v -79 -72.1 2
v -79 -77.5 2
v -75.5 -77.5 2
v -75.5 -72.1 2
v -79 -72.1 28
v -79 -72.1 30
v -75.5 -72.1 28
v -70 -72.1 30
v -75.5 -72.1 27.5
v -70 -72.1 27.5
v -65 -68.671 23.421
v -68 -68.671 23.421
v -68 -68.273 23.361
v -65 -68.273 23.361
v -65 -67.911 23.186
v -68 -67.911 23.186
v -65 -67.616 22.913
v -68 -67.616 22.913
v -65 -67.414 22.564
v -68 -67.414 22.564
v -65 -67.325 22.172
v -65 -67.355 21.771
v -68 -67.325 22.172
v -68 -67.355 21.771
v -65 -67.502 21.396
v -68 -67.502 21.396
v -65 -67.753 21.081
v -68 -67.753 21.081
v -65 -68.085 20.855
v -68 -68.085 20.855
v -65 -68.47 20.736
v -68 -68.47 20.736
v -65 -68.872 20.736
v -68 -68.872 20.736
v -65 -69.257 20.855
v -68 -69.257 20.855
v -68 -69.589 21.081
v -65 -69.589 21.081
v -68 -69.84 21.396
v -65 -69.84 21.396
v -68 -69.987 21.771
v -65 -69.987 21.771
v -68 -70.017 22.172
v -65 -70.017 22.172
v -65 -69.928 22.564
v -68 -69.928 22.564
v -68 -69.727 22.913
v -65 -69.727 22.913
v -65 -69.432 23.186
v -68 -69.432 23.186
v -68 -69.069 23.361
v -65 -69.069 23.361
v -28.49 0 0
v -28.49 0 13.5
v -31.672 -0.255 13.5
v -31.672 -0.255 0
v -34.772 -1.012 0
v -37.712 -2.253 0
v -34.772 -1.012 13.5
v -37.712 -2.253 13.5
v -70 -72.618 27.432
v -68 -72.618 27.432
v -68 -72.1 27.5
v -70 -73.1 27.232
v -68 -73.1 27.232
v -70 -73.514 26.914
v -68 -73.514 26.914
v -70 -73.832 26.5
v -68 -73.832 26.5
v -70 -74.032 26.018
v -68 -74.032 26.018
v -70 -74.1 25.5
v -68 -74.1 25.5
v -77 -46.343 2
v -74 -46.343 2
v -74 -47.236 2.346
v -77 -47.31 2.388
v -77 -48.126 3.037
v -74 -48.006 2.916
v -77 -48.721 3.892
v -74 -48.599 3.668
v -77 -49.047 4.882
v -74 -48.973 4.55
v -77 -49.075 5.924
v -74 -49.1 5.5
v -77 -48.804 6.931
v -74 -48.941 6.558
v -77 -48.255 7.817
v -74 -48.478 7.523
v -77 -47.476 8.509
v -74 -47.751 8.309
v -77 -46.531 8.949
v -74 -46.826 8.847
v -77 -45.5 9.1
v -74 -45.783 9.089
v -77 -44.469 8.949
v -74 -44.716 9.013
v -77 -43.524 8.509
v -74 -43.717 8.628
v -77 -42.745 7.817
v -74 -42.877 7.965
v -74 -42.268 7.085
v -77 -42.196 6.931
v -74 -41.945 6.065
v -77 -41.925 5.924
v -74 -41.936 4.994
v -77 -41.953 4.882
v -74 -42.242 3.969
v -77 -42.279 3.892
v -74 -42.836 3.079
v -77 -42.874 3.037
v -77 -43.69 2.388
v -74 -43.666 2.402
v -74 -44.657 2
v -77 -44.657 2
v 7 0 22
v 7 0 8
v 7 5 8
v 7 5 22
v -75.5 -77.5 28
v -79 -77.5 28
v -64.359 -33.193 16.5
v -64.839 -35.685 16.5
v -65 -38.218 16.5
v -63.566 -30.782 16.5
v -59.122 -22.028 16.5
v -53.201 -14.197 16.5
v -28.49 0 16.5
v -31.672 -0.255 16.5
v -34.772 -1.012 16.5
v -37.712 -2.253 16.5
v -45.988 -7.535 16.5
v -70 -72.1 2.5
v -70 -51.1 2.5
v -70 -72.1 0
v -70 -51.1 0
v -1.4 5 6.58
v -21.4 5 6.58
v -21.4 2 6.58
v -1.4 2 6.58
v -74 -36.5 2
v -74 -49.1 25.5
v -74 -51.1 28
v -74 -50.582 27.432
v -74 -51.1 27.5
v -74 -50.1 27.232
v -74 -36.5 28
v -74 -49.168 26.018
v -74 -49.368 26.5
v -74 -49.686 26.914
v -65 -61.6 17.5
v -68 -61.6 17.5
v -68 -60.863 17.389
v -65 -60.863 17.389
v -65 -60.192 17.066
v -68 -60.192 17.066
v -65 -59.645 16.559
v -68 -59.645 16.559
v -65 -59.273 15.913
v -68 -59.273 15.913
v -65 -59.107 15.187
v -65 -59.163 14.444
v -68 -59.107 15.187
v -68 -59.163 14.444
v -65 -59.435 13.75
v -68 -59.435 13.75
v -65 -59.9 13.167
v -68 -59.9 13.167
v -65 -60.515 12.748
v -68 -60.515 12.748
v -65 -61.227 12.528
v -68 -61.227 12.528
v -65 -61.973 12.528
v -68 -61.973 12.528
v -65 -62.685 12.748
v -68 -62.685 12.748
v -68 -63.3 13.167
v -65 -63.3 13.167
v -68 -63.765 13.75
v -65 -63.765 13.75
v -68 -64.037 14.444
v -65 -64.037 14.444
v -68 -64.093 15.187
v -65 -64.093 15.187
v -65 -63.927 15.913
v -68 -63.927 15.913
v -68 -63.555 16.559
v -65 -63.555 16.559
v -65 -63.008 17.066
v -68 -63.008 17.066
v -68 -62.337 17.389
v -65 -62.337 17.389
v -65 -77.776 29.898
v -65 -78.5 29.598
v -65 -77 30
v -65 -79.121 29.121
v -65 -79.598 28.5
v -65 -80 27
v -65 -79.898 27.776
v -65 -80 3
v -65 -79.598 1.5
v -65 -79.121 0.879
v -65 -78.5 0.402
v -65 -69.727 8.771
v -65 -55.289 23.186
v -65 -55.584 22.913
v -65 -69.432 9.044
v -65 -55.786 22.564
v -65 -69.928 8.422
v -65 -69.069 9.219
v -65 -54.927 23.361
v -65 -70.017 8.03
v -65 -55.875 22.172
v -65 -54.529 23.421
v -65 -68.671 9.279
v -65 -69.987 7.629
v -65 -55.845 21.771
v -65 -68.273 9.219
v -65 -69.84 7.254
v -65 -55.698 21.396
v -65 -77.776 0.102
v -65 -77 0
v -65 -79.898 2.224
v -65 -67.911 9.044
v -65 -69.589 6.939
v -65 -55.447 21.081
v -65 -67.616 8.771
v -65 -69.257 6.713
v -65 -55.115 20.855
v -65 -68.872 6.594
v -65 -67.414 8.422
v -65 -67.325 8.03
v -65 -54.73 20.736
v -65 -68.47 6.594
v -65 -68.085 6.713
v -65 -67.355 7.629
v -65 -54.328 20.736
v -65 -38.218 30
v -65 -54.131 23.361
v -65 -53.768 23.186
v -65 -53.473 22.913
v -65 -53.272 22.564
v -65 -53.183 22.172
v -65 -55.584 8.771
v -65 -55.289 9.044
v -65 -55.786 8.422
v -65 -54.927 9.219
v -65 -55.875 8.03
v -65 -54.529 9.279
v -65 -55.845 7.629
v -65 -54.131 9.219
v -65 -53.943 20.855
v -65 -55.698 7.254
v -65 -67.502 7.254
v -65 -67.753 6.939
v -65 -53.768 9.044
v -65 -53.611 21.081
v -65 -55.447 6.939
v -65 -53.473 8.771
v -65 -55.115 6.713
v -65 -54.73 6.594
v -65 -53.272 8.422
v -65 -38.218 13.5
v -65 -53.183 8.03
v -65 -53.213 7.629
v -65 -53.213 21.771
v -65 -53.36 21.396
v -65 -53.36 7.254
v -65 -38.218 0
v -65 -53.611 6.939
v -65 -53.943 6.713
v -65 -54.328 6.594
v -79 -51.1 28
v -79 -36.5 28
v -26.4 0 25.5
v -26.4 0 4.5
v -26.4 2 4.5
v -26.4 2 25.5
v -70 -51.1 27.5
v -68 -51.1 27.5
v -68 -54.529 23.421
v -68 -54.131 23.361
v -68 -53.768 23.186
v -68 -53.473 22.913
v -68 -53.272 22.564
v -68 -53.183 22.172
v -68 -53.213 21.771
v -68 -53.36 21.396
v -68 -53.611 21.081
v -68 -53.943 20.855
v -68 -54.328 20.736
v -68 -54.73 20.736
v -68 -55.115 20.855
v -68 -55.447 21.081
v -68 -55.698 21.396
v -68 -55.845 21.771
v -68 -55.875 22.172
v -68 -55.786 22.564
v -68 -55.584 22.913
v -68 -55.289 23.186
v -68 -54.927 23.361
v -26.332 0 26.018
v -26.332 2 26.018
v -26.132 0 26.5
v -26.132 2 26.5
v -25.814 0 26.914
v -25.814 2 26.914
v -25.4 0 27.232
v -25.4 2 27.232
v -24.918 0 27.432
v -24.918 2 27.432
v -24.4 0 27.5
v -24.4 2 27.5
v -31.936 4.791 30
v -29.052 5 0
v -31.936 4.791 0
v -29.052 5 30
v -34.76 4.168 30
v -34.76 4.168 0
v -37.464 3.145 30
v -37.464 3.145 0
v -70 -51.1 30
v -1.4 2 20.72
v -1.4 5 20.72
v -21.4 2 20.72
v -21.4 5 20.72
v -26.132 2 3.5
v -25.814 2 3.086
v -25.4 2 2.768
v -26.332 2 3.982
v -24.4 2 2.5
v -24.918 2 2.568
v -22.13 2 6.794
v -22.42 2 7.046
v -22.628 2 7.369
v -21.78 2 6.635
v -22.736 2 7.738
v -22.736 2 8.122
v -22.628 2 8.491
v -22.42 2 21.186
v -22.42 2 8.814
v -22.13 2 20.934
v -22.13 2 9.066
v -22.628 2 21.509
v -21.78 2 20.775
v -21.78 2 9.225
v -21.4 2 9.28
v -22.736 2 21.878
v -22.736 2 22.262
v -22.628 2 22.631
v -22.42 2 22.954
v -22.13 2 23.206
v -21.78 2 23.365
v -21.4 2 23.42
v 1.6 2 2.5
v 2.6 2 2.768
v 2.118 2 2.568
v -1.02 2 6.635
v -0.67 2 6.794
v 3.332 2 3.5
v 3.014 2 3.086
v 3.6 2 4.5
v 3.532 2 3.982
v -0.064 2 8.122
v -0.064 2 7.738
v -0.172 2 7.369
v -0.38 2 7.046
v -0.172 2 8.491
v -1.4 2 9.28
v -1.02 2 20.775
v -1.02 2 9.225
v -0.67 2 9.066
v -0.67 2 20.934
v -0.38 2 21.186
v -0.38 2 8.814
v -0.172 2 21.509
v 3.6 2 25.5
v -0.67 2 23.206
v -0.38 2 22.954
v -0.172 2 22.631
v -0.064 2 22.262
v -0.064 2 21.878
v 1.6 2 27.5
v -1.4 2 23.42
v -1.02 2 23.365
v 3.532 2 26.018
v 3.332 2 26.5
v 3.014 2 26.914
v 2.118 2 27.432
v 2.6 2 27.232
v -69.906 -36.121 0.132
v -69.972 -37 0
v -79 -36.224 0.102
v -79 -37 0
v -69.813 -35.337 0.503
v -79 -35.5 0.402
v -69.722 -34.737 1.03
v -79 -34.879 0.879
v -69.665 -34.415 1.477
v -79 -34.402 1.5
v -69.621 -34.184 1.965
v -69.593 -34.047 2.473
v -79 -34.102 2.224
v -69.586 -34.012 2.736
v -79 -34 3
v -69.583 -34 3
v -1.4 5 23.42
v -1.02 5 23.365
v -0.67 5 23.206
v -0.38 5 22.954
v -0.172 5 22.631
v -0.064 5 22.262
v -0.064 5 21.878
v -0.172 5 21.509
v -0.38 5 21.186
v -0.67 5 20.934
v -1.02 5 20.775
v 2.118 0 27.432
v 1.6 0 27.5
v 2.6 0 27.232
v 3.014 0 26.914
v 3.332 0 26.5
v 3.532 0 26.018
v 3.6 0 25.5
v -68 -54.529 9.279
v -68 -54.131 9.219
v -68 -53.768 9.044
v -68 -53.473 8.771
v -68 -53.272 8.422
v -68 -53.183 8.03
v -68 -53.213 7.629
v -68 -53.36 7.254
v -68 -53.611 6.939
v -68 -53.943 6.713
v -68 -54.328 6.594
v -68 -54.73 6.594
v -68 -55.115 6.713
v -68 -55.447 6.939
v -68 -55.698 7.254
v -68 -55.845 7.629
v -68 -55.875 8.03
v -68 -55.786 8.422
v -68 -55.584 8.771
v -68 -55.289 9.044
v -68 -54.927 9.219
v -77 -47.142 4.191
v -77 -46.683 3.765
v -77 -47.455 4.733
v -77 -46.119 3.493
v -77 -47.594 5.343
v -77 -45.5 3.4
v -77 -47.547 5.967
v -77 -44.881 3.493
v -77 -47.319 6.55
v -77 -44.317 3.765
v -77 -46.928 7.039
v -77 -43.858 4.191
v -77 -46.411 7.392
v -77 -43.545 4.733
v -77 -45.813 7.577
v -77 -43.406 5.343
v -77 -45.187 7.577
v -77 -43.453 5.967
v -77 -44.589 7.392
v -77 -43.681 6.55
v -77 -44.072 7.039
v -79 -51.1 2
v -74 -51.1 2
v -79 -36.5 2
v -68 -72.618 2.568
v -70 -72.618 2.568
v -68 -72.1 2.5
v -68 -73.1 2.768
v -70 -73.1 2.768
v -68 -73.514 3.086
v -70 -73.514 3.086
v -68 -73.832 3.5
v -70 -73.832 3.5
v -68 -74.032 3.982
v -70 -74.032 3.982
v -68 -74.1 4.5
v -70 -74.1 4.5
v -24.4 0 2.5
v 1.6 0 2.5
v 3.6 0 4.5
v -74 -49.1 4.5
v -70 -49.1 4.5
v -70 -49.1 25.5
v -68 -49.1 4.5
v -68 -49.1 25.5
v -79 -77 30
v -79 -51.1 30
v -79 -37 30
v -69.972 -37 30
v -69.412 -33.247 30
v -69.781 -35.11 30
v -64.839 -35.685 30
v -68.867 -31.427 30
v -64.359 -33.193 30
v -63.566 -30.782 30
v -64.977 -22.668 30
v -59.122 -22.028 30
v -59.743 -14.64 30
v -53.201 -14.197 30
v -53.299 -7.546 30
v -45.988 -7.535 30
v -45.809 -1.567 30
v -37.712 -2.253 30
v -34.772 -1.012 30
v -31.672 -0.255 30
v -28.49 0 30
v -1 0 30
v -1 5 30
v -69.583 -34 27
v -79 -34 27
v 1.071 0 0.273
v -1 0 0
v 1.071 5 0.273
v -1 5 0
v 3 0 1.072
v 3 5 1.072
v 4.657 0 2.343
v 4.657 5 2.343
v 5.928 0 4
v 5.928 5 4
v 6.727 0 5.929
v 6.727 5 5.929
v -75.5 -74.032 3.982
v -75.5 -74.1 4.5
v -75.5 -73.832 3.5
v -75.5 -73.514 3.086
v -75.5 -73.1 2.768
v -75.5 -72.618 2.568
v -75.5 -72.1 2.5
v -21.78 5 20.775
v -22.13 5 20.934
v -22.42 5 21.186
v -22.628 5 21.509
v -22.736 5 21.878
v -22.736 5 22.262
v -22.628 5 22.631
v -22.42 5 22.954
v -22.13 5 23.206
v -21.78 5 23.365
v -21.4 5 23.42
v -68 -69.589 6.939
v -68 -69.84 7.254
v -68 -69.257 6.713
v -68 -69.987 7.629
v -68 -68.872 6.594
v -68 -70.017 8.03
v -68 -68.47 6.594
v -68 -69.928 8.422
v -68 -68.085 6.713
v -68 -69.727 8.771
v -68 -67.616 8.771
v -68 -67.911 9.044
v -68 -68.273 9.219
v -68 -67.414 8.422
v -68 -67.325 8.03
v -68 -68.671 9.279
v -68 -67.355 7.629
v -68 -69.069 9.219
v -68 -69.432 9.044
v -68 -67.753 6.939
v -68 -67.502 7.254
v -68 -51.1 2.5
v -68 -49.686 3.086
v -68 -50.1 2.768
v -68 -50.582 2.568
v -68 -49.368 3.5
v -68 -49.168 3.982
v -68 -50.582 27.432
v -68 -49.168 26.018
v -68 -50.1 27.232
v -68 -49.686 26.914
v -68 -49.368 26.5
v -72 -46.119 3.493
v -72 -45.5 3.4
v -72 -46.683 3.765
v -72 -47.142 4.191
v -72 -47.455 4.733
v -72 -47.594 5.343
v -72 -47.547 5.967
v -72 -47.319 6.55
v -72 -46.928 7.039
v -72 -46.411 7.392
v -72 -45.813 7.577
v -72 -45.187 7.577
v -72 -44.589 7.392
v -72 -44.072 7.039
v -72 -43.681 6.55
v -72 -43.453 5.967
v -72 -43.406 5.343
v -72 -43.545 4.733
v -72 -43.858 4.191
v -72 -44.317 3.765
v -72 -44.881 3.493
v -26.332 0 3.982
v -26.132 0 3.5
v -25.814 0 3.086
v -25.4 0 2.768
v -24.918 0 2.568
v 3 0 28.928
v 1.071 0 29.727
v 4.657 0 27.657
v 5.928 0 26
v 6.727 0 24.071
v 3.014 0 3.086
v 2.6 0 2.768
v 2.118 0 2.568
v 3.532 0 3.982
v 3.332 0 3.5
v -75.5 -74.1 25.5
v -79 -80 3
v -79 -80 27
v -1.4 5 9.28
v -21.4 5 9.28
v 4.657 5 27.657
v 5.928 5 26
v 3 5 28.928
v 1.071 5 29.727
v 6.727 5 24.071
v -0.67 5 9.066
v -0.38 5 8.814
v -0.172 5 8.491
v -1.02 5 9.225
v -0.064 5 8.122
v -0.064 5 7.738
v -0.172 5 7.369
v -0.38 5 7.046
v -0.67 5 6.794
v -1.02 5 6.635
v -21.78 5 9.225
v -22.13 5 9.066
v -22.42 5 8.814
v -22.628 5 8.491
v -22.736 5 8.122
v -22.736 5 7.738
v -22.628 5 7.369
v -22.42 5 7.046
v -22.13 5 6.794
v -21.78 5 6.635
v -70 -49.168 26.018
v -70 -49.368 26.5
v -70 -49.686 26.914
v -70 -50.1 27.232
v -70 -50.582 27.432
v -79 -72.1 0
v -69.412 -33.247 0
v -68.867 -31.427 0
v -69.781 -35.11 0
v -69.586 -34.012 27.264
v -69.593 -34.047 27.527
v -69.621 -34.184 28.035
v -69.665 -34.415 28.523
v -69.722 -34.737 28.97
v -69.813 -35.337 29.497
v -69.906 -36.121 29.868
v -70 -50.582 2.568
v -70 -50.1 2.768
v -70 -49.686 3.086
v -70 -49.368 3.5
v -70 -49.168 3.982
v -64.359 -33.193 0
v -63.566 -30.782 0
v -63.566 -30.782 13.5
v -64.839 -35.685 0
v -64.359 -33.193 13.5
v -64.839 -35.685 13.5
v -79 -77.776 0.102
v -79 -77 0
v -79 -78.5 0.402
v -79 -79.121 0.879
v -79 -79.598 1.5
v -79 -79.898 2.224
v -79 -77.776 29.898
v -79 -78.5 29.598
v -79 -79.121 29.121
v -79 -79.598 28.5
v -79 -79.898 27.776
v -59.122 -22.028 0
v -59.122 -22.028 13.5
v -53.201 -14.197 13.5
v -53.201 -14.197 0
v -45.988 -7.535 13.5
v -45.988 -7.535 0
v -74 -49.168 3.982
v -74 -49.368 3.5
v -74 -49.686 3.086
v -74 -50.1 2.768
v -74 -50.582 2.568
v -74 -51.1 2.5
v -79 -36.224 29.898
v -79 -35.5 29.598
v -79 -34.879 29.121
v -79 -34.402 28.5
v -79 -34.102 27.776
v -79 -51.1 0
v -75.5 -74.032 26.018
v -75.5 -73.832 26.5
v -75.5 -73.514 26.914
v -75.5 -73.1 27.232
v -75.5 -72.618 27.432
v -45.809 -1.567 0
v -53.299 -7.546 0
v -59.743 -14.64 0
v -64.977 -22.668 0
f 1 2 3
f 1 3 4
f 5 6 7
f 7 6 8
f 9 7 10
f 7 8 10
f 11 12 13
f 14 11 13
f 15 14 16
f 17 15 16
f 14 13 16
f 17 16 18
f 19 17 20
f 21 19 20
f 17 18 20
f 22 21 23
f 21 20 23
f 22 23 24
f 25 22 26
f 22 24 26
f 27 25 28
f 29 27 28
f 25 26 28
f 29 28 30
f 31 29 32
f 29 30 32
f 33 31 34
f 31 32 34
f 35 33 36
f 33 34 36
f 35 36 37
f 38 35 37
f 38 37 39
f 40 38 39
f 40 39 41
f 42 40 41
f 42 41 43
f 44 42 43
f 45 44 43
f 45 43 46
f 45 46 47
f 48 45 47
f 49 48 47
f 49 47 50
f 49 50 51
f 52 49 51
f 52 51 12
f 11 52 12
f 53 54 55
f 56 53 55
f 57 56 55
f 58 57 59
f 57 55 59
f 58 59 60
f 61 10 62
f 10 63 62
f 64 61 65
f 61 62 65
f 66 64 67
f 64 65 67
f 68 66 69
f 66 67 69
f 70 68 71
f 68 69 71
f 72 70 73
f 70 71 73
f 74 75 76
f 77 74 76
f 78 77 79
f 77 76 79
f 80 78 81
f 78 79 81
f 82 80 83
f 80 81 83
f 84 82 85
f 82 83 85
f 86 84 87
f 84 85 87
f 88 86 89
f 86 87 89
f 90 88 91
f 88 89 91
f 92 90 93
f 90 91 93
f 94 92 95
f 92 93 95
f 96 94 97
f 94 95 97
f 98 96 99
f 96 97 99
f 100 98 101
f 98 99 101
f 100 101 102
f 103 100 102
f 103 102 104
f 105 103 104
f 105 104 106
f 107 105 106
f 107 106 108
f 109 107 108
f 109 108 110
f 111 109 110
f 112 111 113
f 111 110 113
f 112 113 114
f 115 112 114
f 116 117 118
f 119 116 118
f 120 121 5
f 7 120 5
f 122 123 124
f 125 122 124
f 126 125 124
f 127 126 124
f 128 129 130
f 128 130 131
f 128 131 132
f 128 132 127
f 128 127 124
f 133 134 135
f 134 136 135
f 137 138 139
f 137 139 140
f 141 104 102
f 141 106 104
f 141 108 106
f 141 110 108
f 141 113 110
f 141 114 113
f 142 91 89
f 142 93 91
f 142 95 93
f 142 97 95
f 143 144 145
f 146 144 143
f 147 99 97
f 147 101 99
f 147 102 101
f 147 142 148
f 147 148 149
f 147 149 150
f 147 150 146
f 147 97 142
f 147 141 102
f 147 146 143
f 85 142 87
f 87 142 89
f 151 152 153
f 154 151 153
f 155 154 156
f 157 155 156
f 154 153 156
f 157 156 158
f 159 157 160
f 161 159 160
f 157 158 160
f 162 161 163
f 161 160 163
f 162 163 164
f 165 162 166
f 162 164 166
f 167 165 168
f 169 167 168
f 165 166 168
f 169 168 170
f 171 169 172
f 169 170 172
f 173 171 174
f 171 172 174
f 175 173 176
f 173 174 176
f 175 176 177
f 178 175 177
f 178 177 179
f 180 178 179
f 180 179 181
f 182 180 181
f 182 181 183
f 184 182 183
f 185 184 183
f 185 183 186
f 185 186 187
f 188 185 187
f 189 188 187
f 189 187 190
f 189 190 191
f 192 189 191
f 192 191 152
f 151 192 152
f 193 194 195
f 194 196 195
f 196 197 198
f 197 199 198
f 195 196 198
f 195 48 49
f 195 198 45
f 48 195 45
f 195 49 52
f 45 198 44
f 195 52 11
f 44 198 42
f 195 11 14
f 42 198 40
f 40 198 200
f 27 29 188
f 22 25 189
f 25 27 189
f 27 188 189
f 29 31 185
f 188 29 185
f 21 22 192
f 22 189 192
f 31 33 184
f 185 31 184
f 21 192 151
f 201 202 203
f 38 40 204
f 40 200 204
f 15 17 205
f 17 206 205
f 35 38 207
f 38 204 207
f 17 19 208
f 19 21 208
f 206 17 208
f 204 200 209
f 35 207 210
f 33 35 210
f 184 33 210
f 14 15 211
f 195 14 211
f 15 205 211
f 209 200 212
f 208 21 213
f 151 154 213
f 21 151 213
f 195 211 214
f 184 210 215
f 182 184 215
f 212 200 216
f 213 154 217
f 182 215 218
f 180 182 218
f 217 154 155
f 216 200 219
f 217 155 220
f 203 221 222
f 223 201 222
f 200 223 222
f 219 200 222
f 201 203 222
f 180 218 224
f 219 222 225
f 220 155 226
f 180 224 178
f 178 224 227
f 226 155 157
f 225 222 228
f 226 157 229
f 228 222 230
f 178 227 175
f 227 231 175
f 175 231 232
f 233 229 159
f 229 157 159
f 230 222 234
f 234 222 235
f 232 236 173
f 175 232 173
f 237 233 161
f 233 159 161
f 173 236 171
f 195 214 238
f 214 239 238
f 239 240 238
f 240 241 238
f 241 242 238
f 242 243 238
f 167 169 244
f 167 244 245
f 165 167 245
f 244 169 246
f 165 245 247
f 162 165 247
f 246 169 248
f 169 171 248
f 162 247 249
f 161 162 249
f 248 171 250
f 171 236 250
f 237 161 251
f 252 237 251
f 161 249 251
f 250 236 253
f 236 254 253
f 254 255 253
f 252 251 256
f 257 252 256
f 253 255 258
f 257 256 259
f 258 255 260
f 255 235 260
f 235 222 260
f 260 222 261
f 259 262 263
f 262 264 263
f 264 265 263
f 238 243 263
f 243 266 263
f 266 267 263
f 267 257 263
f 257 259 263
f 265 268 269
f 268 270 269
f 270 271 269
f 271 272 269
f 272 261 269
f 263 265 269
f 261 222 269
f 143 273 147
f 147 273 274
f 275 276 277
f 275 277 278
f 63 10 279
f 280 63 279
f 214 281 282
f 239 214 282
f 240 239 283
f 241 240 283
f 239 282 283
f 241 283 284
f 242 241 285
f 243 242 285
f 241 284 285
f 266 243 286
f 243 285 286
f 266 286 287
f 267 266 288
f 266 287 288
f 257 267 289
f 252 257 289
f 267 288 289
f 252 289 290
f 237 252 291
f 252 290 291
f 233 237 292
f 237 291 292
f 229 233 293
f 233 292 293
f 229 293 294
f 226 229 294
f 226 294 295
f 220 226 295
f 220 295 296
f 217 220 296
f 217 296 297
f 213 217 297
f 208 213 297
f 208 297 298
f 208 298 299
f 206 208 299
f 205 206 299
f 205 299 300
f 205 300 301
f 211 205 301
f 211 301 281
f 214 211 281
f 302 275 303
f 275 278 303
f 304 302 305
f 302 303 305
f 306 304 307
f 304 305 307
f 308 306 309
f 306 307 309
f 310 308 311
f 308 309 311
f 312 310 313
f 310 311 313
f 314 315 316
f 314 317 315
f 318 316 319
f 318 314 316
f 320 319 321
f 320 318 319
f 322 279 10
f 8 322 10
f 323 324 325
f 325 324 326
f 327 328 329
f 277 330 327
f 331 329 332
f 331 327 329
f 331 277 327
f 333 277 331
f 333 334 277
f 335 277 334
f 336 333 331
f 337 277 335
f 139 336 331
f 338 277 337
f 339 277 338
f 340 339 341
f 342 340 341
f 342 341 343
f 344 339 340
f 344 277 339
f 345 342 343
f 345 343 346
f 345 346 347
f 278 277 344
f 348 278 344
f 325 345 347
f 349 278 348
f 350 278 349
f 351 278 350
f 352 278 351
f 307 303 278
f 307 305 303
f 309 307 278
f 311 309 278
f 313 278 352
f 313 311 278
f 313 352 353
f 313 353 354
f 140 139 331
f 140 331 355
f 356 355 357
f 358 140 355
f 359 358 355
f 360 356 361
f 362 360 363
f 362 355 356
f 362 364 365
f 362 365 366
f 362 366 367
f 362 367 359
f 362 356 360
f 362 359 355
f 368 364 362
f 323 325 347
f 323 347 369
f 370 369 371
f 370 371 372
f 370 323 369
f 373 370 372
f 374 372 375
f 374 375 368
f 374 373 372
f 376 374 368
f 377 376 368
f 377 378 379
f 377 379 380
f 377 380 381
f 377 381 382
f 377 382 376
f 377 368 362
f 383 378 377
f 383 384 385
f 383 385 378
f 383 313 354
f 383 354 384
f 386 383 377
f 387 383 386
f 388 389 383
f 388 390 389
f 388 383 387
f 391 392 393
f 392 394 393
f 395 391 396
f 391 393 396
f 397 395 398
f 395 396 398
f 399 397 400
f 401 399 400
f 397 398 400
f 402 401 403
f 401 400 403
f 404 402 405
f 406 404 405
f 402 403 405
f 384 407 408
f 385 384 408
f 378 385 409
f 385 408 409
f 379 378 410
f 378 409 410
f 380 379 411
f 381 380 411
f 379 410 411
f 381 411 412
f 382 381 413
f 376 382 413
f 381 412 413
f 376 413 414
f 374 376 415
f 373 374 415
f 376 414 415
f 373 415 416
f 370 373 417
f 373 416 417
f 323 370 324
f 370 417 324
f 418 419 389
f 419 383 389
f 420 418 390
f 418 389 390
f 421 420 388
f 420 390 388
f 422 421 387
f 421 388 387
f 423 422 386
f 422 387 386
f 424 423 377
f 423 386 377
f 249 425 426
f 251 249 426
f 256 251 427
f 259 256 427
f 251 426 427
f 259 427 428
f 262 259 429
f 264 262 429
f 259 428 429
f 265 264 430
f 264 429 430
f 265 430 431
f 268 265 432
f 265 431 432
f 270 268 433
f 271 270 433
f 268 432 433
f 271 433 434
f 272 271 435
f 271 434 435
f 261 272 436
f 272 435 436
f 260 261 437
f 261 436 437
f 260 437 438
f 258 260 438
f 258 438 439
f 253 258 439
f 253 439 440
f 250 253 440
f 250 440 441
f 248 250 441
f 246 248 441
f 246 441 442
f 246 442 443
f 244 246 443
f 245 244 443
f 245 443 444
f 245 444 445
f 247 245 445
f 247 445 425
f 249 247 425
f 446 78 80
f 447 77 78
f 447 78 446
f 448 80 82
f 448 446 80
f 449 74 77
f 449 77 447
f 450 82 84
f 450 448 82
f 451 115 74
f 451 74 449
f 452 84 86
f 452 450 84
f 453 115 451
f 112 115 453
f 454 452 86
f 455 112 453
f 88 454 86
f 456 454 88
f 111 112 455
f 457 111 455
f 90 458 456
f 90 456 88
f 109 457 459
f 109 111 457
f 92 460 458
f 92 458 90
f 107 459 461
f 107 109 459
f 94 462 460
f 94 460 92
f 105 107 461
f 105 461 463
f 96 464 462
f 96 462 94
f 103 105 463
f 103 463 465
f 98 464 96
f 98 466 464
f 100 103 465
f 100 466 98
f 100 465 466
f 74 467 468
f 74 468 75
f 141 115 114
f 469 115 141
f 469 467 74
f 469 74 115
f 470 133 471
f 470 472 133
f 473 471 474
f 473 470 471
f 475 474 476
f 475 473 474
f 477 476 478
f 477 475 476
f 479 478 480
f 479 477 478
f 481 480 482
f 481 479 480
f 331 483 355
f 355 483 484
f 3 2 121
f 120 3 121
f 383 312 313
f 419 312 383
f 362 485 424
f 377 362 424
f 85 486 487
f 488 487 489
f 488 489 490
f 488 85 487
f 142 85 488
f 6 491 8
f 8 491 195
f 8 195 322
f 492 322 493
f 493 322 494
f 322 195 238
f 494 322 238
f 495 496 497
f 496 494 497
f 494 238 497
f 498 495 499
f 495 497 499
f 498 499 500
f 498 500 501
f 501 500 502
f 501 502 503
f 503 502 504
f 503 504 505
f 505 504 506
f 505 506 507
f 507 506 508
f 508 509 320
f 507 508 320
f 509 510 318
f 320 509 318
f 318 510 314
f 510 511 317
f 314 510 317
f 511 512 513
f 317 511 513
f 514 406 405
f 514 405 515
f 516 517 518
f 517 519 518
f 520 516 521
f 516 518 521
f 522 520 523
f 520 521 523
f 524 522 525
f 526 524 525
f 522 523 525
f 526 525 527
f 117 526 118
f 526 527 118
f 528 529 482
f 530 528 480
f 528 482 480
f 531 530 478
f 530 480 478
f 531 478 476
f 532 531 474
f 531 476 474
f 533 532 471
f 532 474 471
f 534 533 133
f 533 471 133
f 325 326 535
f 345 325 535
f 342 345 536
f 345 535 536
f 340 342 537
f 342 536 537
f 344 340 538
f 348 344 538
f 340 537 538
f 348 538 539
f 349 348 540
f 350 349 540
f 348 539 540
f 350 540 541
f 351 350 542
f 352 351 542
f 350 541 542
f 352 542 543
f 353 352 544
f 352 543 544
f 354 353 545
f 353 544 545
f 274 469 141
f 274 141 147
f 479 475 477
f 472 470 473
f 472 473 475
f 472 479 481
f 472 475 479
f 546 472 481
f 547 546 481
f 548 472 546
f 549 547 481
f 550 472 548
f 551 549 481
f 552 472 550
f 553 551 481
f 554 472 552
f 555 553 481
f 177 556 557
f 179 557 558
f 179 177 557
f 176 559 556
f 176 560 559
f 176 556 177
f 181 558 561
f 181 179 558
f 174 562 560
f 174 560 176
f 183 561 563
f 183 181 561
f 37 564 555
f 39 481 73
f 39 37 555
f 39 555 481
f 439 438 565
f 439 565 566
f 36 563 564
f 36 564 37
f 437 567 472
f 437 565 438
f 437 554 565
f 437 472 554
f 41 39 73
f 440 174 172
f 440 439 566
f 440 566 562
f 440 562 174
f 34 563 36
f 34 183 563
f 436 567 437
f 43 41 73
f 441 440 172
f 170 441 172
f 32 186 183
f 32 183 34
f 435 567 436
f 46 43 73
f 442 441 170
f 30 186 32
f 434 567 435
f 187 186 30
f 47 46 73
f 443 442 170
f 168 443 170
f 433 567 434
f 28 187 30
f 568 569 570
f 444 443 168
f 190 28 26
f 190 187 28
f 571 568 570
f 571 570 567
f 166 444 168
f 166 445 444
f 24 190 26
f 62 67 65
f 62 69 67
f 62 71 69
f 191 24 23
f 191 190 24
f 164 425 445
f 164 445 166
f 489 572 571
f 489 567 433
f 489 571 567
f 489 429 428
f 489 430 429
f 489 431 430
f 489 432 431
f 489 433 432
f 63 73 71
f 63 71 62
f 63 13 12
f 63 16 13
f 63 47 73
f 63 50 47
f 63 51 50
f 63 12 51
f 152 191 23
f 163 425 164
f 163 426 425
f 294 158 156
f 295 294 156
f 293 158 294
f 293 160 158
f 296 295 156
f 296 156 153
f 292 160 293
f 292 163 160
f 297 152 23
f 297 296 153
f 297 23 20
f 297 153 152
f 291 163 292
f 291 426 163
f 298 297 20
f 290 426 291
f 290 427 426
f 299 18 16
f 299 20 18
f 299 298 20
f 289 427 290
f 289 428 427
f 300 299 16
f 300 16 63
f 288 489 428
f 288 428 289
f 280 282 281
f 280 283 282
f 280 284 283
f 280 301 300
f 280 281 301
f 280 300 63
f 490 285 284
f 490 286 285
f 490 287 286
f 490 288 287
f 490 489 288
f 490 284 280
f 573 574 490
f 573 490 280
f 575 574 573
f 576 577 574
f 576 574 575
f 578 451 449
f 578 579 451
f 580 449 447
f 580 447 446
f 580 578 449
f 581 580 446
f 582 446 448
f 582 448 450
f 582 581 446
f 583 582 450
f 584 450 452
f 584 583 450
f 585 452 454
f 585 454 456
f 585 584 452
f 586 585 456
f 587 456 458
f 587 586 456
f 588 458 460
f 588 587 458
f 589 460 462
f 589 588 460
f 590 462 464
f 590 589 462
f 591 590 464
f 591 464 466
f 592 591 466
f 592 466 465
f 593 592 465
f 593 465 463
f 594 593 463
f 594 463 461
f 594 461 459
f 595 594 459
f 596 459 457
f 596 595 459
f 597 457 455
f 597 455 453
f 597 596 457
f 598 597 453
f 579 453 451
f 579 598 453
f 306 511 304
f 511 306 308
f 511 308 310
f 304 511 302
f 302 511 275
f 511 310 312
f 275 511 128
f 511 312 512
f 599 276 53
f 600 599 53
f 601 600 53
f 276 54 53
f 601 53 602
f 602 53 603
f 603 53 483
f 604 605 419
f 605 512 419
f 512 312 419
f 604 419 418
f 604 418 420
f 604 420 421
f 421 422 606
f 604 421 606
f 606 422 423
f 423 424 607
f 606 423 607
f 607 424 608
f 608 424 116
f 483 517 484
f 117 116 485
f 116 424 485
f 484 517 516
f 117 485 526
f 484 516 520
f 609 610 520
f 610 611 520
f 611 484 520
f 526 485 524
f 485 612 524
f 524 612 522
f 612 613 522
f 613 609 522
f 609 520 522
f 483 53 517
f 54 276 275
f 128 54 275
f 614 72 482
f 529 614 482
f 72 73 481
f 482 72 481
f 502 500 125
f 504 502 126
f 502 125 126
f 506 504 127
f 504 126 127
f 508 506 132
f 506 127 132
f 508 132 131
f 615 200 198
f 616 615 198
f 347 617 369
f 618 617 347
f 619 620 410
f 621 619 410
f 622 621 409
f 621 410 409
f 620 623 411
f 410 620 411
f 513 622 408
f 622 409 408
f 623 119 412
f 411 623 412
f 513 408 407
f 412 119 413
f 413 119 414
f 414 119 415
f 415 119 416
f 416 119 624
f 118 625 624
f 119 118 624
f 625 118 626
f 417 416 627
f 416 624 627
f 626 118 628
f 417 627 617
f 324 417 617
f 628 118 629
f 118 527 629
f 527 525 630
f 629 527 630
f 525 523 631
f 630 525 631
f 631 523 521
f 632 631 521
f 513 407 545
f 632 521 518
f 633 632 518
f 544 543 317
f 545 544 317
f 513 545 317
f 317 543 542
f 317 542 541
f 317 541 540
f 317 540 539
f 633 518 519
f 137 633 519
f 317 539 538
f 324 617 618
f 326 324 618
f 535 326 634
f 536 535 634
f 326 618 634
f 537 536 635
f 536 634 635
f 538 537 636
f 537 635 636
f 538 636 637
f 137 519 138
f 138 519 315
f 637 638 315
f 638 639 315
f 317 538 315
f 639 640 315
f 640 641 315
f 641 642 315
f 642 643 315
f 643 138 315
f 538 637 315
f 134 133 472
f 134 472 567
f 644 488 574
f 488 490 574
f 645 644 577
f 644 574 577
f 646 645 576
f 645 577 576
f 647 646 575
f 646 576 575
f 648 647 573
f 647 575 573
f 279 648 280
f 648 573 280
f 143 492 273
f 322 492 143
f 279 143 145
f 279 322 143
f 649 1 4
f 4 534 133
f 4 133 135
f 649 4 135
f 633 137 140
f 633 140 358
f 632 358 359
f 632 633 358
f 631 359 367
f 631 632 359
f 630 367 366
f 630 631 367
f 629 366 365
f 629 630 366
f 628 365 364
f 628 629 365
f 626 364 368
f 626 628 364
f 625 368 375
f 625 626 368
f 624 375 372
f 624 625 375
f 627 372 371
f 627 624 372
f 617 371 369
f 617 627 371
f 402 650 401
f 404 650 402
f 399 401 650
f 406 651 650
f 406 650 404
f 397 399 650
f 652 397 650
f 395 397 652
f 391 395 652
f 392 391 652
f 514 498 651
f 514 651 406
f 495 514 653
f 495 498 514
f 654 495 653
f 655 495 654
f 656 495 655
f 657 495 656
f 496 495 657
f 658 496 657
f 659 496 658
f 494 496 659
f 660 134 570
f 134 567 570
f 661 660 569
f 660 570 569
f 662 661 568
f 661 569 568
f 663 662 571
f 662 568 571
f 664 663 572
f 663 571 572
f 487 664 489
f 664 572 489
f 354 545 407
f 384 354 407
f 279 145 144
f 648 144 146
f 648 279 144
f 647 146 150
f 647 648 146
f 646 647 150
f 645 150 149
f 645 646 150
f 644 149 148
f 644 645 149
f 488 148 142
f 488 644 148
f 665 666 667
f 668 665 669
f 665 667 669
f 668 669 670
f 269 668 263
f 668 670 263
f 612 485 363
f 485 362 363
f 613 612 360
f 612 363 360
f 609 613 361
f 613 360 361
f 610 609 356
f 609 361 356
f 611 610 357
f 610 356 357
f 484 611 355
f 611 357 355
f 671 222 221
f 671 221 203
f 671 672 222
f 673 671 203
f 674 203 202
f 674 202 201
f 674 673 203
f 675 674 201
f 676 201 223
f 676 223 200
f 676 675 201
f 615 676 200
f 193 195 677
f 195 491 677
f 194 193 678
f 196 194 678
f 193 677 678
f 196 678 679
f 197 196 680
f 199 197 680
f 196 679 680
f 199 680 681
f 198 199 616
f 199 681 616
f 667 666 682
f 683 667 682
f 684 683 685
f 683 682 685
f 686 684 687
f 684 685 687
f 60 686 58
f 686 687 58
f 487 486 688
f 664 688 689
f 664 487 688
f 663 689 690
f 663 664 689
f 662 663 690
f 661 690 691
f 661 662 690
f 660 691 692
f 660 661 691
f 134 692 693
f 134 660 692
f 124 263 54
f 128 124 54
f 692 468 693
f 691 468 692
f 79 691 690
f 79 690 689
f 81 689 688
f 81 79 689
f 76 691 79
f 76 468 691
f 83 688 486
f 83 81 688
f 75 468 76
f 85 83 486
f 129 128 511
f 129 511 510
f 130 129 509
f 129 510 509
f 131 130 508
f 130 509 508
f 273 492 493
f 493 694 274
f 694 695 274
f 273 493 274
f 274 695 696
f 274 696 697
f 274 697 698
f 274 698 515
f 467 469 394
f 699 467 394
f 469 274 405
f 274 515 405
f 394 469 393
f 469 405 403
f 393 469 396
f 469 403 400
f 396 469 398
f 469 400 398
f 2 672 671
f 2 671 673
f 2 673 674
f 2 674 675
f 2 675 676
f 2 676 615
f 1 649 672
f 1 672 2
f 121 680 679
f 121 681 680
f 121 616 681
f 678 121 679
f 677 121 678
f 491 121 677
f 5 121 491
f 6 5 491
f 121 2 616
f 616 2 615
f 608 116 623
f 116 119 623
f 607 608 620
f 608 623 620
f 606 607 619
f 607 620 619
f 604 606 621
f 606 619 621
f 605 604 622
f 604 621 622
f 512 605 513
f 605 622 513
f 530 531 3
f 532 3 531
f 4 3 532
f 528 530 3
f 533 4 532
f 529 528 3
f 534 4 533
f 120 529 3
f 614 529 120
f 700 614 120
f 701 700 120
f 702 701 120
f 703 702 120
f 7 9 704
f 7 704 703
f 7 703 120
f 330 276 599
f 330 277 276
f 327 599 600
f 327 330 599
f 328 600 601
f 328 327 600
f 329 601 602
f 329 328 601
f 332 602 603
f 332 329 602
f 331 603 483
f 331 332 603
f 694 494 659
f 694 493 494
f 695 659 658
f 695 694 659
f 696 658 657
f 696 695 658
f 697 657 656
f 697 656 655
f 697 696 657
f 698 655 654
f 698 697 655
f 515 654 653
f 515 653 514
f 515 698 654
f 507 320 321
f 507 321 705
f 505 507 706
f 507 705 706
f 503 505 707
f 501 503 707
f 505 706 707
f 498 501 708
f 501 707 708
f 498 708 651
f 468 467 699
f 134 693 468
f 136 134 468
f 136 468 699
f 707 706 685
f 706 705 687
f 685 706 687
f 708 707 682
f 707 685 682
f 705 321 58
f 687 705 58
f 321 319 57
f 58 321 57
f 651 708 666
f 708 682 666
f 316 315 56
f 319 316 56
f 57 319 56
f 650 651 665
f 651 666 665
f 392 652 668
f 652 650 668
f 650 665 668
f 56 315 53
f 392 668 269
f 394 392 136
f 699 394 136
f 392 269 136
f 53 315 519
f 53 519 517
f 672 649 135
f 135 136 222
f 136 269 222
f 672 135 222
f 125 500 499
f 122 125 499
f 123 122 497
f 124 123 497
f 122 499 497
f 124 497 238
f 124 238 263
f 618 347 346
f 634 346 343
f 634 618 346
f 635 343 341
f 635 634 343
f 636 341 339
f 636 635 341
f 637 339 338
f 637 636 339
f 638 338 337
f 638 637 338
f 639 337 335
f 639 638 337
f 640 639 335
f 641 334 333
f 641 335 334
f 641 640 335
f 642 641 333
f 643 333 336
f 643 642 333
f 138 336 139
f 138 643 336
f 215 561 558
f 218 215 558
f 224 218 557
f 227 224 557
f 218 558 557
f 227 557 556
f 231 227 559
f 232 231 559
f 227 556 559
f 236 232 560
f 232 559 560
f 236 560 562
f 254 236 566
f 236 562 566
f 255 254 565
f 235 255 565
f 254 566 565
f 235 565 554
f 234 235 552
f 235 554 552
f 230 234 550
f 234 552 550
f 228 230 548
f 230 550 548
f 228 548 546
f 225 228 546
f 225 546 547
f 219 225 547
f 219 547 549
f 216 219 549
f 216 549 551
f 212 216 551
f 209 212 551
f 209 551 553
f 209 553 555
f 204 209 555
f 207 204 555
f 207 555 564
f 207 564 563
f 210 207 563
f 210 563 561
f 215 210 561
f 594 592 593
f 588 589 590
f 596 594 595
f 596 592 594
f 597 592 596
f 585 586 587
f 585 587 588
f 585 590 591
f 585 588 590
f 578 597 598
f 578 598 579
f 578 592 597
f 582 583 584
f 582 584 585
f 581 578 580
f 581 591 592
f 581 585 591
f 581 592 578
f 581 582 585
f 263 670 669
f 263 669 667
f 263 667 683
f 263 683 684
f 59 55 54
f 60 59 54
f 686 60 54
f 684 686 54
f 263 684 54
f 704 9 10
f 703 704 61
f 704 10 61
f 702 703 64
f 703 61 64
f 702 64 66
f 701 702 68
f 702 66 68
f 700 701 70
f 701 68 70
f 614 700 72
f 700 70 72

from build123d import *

# Parameters (mm, degrees)
SALIENTE_EXTRUIR1_DEPTH      = 30
CORTAR_EXTRUIR1_DEPTH        = 5
CROQUIS3_W                   = 30
CROQUIS3_H                   = 25
CORTAR_EXTRUIR2_DEPTH        = 2
CROQUIS4_R                   = 1.35
CROQUIS4_R_2                 = 2.5
CORTAR_EXTRUIR3_DEPTH        = 5
CROQUIS5_W                   = 25
CROQUIS5_H                   = 25
CORTAR_EXTRUIR4_DEPTH        = 2
REDONDEO2_R                  = 20
REDONDEO3_R                  = 8
REDONDEO4_R                  = 2
SALIENTE_EXTRUIR2_DEPTH      = 9
SALIENTE_EXTRUIR2_DEPTH_BACK = 1
CORTAR_EXTRUIR5_START        = 9
CROQUIS10_W                  = 26
CROQUIS10_H                  = 14.6
CORTAR_EXTRUIR5_DEPTH        = 5
SALIENTE_EXTRUIR3_START      = 4
CROQUIS12_R                  = 3.6
CROQUIS12_R_2                = 2.1
SALIENTE_EXTRUIR3_DEPTH      = 3
CORTAR_EXTRUIR7_START        = -2
CROQUIS13_R                  = 2.1
CORTAR_EXTRUIR7_DEPTH        = 5
CORTAR_EXTRUIR8_START        = 9
CROQUIS14_W                  = 26
CROQUIS14_H                  = 5.4
CORTAR_EXTRUIR8_DEPTH        = 3.5
REDONDEO5_R                  = 3
SALIENTE_EXTRUIR4_DEPTH      = 1.5
SALIENTE_EXTRUIR4_DEPTH_BACK = 1.5
SALIENTE_EXTRUIR4_START      = -15


with BuildPart() as part:
    # Croquis1 → Saliente-Extruir1 (new body)
    with BuildSketch(Plane.XY):
        with BuildLine():
            Line((7, 0), (7, 5))
            Line((7, 5), (-33, 5))
            ThreePointArc((-33, 5), (-56.296113, -10.563595), (-70, -35))
            Line((-70, -35), (-70, -80))
            Line((-70, -80), (-65, -80))
            Line((-65, -80), (-65, -34.805195))
            ThreePointArc((-65, -34.805195), (-52.819114, -13.779819), (-32.805195, 0))
            Line((-32.805195, 0), (7, 0))
        make_face()
    extrude(amount=SALIENTE_EXTRUIR1_DEPTH)

    # Croquis2 → Cortar-Extruir1 (cut)
    with BuildSketch(Plane(origin=(0, 5, 0), x_dir=(1, 0, 0), z_dir=(0, 1, 0))):
        with BuildLine():
            Line((-11.4, -6.58), (-1.4, -6.58))
            ThreePointArc((-1.4, -6.58), (-0.05, -7.93), (-1.4, -9.28))
            Line((-1.4, -9.28), (-21.400001, -9.28))
            ThreePointArc((-21.400001, -9.28), (-22.75, -7.93), (-21.4, -6.58))
            Line((-21.4, -6.58), (-11.4, -6.58))
        make_face()
        with BuildLine():
            Line((-1.4, -20.72), (-21.400001, -20.72))
            ThreePointArc((-21.400001, -20.72), (-22.75, -22.07), (-21.4, -23.42))
            Line((-21.4, -23.42), (-11.4, -23.42))
            Line((-11.4, -23.42), (-1.4, -23.42))
            ThreePointArc((-1.4, -23.42), (-0.05, -22.07), (-1.4, -20.72))
        make_face()
    extrude(amount=-CORTAR_EXTRUIR1_DEPTH, mode=Mode.SUBTRACT)

    # Croquis3 → Cortar-Extruir2 (cut)
    with BuildSketch(Plane.XZ):
        with Locations((-11.4, 15)):
            Rectangle(CROQUIS3_W, CROQUIS3_H)
    extrude(amount=-CORTAR_EXTRUIR2_DEPTH, mode=Mode.SUBTRACT)

    # Croquis4 → Cortar-Extruir3 (cut)
    with BuildSketch(Plane.ZY.offset(70)):
        with Locations((22.071068, -54.528932)):
            Circle(CROQUIS4_R)
        with Locations((22.071068, -68.671068)):
            Circle(CROQUIS4_R)
        with Locations((7.928932, -68.671068)):
            Circle(CROQUIS4_R)
        with Locations((7.928932, -54.528932)):
            Circle(CROQUIS4_R)
        with Locations((15, -61.6)):
            Circle(CROQUIS4_R_2)
    extrude(amount=-CORTAR_EXTRUIR3_DEPTH, mode=Mode.SUBTRACT)

    # Croquis5 → Cortar-Extruir4 (cut)
    with BuildSketch(Plane.ZY.offset(70)):
        with Locations((15, -61.6)):
            Rectangle(CROQUIS5_W, CROQUIS5_H)
    extrude(amount=-CORTAR_EXTRUIR4_DEPTH, mode=Mode.SUBTRACT)

    # Redondeo2
    redondeo2_edges = [part.edges().sort_by_distance(p)[0] for p in [
        (-32.805195, 0, 15),
        (-65, -34.805195, 15),
        (-70, -35, 15),
        (-33, 5, 15),
    ]]
    fillet(redondeo2_edges, radius=REDONDEO2_R)

    # Redondeo3
    redondeo3_edges = [part.edges().sort_by_distance(p)[0] for p in [
        (7, 2.5, 0),
        (7, 2.5, 30),
    ]]
    fillet(redondeo3_edges, radius=REDONDEO3_R)

    # Redondeo4
    redondeo4_edges = [part.edges().sort_by_distance(p)[0] for p in [
        (-69, -49.1, 27.5),
        (-69, -74.1, 27.5),
        (-69, -74.1, 2.5),
        (-69, -49.1, 2.5),
        (3.6, 1, 27.5),
        (3.6, 1, 2.5),
        (-26.4, 1, 2.5),
        (-26.4, 1, 27.5),
    ]]
    fillet(redondeo4_edges, radius=REDONDEO4_R)

    # Croquis8 → Saliente-Extruir2 (add, two sides: drawn at the far end of the back side and taken through both)
    with BuildSketch(Plane.ZY.offset(70).offset(-SALIENTE_EXTRUIR2_DEPTH_BACK)):
        with BuildLine():
            Line((2.5, -72.1), (0, -72.1))
            Line((0, -72.1), (0, -80))
            Line((0, -80), (30, -80))
            Line((30, -80), (30, -72.1))
            Line((30, -72.1), (27.5, -72.1))
            ThreePointArc((27.5, -72.1), (26.914214, -73.514214), (25.5, -74.1))
            Line((25.5, -74.1), (4.5, -74.1))
            ThreePointArc((4.5, -74.1), (3.085786, -73.514214), (2.5, -72.1))
        make_face()
        with BuildLine():
            Line((2.5, -51.1), (0, -51.1))
            Line((0, -51.1), (0, -34))
            Line((0, -34), (30, -34))
            Line((30, -34), (30, -51.1))
            Line((30, -51.1), (27.5, -51.1))
            ThreePointArc((27.5, -51.1), (26.914214, -49.685786), (25.5, -49.1))
            Line((25.5, -49.1), (4.5, -49.1))
            ThreePointArc((4.5, -49.1), (3.085786, -49.685786), (2.5, -51.1))
        make_face()
    extrude(amount=SALIENTE_EXTRUIR2_DEPTH + SALIENTE_EXTRUIR2_DEPTH_BACK)

    # Croquis10 → Cortar-Extruir5 (cut)
    with BuildSketch(Plane.ZY.offset(70).offset(CORTAR_EXTRUIR5_START)):
        with Locations((15, -43.8)):
            Rectangle(CROQUIS10_W, CROQUIS10_H)
    extrude(amount=-CORTAR_EXTRUIR5_DEPTH, mode=Mode.SUBTRACT)

    # Croquis12 → Saliente-Extruir3 (add)
    with BuildSketch(Plane.ZY.offset(70).offset(SALIENTE_EXTRUIR3_START)):
        with Locations((5.5, -45.5)):
            Circle(CROQUIS12_R)
        with Locations(Location((5.5, -45.5, 0), (0, 0, 180))):
            Circle(CROQUIS12_R_2, mode=Mode.SUBTRACT)
    extrude(amount=SALIENTE_EXTRUIR3_DEPTH)

    # Croquis13 → Cortar-Extruir7 (cut)
    with BuildSketch(Plane.ZY.offset(74).offset(CORTAR_EXTRUIR7_START)):
        with Locations(Location((5.5, -45.5, 0), (0, 0, 180))):
            Circle(CROQUIS13_R)
    extrude(amount=CORTAR_EXTRUIR7_DEPTH, mode=Mode.SUBTRACT)

    # Croquis14 → Cortar-Extruir8 (cut)
    with BuildSketch(Plane.ZY.offset(70).offset(CORTAR_EXTRUIR8_START)):
        with Locations((15, -74.8)):
            Rectangle(CROQUIS14_W, CROQUIS14_H)
    extrude(amount=-CORTAR_EXTRUIR8_DEPTH, mode=Mode.SUBTRACT)

    # Redondeo5
    redondeo5_edges = [part.edges().sort_by_distance(p)[0] for p in [
        (-72, -80, 30),
        (-74.291633, -34, 30),
        (-74.291633, -34, 0),
        (-72, -80, 0),
    ]]
    fillet(redondeo5_edges, radius=REDONDEO5_R)

    # Croquis15 → Saliente-Extruir4 (add, two sides: drawn at the far end of the back side and taken through both)
    with BuildSketch(Plane.XY.offset(30).offset(SALIENTE_EXTRUIR4_START - SALIENTE_EXTRUIR4_DEPTH_BACK)):
        with BuildLine():
            Line((-65, -38.217888), (-28.4904, 0))
            ThreePointArc((-28.4904, 0), (-33.236938, -0.571403), (-37.712257, -2.252962))
            ThreePointArc((-37.712257, -2.252962), (-53.200641, -14.196528), (-63.566437, -30.782337))
            ThreePointArc((-63.566437, -30.782337), (-64.638339, -34.431646), (-65, -38.217888))
        make_face()
    extrude(amount=SALIENTE_EXTRUIR4_DEPTH + SALIENTE_EXTRUIR4_DEPTH_BACK)


solid = part.part
